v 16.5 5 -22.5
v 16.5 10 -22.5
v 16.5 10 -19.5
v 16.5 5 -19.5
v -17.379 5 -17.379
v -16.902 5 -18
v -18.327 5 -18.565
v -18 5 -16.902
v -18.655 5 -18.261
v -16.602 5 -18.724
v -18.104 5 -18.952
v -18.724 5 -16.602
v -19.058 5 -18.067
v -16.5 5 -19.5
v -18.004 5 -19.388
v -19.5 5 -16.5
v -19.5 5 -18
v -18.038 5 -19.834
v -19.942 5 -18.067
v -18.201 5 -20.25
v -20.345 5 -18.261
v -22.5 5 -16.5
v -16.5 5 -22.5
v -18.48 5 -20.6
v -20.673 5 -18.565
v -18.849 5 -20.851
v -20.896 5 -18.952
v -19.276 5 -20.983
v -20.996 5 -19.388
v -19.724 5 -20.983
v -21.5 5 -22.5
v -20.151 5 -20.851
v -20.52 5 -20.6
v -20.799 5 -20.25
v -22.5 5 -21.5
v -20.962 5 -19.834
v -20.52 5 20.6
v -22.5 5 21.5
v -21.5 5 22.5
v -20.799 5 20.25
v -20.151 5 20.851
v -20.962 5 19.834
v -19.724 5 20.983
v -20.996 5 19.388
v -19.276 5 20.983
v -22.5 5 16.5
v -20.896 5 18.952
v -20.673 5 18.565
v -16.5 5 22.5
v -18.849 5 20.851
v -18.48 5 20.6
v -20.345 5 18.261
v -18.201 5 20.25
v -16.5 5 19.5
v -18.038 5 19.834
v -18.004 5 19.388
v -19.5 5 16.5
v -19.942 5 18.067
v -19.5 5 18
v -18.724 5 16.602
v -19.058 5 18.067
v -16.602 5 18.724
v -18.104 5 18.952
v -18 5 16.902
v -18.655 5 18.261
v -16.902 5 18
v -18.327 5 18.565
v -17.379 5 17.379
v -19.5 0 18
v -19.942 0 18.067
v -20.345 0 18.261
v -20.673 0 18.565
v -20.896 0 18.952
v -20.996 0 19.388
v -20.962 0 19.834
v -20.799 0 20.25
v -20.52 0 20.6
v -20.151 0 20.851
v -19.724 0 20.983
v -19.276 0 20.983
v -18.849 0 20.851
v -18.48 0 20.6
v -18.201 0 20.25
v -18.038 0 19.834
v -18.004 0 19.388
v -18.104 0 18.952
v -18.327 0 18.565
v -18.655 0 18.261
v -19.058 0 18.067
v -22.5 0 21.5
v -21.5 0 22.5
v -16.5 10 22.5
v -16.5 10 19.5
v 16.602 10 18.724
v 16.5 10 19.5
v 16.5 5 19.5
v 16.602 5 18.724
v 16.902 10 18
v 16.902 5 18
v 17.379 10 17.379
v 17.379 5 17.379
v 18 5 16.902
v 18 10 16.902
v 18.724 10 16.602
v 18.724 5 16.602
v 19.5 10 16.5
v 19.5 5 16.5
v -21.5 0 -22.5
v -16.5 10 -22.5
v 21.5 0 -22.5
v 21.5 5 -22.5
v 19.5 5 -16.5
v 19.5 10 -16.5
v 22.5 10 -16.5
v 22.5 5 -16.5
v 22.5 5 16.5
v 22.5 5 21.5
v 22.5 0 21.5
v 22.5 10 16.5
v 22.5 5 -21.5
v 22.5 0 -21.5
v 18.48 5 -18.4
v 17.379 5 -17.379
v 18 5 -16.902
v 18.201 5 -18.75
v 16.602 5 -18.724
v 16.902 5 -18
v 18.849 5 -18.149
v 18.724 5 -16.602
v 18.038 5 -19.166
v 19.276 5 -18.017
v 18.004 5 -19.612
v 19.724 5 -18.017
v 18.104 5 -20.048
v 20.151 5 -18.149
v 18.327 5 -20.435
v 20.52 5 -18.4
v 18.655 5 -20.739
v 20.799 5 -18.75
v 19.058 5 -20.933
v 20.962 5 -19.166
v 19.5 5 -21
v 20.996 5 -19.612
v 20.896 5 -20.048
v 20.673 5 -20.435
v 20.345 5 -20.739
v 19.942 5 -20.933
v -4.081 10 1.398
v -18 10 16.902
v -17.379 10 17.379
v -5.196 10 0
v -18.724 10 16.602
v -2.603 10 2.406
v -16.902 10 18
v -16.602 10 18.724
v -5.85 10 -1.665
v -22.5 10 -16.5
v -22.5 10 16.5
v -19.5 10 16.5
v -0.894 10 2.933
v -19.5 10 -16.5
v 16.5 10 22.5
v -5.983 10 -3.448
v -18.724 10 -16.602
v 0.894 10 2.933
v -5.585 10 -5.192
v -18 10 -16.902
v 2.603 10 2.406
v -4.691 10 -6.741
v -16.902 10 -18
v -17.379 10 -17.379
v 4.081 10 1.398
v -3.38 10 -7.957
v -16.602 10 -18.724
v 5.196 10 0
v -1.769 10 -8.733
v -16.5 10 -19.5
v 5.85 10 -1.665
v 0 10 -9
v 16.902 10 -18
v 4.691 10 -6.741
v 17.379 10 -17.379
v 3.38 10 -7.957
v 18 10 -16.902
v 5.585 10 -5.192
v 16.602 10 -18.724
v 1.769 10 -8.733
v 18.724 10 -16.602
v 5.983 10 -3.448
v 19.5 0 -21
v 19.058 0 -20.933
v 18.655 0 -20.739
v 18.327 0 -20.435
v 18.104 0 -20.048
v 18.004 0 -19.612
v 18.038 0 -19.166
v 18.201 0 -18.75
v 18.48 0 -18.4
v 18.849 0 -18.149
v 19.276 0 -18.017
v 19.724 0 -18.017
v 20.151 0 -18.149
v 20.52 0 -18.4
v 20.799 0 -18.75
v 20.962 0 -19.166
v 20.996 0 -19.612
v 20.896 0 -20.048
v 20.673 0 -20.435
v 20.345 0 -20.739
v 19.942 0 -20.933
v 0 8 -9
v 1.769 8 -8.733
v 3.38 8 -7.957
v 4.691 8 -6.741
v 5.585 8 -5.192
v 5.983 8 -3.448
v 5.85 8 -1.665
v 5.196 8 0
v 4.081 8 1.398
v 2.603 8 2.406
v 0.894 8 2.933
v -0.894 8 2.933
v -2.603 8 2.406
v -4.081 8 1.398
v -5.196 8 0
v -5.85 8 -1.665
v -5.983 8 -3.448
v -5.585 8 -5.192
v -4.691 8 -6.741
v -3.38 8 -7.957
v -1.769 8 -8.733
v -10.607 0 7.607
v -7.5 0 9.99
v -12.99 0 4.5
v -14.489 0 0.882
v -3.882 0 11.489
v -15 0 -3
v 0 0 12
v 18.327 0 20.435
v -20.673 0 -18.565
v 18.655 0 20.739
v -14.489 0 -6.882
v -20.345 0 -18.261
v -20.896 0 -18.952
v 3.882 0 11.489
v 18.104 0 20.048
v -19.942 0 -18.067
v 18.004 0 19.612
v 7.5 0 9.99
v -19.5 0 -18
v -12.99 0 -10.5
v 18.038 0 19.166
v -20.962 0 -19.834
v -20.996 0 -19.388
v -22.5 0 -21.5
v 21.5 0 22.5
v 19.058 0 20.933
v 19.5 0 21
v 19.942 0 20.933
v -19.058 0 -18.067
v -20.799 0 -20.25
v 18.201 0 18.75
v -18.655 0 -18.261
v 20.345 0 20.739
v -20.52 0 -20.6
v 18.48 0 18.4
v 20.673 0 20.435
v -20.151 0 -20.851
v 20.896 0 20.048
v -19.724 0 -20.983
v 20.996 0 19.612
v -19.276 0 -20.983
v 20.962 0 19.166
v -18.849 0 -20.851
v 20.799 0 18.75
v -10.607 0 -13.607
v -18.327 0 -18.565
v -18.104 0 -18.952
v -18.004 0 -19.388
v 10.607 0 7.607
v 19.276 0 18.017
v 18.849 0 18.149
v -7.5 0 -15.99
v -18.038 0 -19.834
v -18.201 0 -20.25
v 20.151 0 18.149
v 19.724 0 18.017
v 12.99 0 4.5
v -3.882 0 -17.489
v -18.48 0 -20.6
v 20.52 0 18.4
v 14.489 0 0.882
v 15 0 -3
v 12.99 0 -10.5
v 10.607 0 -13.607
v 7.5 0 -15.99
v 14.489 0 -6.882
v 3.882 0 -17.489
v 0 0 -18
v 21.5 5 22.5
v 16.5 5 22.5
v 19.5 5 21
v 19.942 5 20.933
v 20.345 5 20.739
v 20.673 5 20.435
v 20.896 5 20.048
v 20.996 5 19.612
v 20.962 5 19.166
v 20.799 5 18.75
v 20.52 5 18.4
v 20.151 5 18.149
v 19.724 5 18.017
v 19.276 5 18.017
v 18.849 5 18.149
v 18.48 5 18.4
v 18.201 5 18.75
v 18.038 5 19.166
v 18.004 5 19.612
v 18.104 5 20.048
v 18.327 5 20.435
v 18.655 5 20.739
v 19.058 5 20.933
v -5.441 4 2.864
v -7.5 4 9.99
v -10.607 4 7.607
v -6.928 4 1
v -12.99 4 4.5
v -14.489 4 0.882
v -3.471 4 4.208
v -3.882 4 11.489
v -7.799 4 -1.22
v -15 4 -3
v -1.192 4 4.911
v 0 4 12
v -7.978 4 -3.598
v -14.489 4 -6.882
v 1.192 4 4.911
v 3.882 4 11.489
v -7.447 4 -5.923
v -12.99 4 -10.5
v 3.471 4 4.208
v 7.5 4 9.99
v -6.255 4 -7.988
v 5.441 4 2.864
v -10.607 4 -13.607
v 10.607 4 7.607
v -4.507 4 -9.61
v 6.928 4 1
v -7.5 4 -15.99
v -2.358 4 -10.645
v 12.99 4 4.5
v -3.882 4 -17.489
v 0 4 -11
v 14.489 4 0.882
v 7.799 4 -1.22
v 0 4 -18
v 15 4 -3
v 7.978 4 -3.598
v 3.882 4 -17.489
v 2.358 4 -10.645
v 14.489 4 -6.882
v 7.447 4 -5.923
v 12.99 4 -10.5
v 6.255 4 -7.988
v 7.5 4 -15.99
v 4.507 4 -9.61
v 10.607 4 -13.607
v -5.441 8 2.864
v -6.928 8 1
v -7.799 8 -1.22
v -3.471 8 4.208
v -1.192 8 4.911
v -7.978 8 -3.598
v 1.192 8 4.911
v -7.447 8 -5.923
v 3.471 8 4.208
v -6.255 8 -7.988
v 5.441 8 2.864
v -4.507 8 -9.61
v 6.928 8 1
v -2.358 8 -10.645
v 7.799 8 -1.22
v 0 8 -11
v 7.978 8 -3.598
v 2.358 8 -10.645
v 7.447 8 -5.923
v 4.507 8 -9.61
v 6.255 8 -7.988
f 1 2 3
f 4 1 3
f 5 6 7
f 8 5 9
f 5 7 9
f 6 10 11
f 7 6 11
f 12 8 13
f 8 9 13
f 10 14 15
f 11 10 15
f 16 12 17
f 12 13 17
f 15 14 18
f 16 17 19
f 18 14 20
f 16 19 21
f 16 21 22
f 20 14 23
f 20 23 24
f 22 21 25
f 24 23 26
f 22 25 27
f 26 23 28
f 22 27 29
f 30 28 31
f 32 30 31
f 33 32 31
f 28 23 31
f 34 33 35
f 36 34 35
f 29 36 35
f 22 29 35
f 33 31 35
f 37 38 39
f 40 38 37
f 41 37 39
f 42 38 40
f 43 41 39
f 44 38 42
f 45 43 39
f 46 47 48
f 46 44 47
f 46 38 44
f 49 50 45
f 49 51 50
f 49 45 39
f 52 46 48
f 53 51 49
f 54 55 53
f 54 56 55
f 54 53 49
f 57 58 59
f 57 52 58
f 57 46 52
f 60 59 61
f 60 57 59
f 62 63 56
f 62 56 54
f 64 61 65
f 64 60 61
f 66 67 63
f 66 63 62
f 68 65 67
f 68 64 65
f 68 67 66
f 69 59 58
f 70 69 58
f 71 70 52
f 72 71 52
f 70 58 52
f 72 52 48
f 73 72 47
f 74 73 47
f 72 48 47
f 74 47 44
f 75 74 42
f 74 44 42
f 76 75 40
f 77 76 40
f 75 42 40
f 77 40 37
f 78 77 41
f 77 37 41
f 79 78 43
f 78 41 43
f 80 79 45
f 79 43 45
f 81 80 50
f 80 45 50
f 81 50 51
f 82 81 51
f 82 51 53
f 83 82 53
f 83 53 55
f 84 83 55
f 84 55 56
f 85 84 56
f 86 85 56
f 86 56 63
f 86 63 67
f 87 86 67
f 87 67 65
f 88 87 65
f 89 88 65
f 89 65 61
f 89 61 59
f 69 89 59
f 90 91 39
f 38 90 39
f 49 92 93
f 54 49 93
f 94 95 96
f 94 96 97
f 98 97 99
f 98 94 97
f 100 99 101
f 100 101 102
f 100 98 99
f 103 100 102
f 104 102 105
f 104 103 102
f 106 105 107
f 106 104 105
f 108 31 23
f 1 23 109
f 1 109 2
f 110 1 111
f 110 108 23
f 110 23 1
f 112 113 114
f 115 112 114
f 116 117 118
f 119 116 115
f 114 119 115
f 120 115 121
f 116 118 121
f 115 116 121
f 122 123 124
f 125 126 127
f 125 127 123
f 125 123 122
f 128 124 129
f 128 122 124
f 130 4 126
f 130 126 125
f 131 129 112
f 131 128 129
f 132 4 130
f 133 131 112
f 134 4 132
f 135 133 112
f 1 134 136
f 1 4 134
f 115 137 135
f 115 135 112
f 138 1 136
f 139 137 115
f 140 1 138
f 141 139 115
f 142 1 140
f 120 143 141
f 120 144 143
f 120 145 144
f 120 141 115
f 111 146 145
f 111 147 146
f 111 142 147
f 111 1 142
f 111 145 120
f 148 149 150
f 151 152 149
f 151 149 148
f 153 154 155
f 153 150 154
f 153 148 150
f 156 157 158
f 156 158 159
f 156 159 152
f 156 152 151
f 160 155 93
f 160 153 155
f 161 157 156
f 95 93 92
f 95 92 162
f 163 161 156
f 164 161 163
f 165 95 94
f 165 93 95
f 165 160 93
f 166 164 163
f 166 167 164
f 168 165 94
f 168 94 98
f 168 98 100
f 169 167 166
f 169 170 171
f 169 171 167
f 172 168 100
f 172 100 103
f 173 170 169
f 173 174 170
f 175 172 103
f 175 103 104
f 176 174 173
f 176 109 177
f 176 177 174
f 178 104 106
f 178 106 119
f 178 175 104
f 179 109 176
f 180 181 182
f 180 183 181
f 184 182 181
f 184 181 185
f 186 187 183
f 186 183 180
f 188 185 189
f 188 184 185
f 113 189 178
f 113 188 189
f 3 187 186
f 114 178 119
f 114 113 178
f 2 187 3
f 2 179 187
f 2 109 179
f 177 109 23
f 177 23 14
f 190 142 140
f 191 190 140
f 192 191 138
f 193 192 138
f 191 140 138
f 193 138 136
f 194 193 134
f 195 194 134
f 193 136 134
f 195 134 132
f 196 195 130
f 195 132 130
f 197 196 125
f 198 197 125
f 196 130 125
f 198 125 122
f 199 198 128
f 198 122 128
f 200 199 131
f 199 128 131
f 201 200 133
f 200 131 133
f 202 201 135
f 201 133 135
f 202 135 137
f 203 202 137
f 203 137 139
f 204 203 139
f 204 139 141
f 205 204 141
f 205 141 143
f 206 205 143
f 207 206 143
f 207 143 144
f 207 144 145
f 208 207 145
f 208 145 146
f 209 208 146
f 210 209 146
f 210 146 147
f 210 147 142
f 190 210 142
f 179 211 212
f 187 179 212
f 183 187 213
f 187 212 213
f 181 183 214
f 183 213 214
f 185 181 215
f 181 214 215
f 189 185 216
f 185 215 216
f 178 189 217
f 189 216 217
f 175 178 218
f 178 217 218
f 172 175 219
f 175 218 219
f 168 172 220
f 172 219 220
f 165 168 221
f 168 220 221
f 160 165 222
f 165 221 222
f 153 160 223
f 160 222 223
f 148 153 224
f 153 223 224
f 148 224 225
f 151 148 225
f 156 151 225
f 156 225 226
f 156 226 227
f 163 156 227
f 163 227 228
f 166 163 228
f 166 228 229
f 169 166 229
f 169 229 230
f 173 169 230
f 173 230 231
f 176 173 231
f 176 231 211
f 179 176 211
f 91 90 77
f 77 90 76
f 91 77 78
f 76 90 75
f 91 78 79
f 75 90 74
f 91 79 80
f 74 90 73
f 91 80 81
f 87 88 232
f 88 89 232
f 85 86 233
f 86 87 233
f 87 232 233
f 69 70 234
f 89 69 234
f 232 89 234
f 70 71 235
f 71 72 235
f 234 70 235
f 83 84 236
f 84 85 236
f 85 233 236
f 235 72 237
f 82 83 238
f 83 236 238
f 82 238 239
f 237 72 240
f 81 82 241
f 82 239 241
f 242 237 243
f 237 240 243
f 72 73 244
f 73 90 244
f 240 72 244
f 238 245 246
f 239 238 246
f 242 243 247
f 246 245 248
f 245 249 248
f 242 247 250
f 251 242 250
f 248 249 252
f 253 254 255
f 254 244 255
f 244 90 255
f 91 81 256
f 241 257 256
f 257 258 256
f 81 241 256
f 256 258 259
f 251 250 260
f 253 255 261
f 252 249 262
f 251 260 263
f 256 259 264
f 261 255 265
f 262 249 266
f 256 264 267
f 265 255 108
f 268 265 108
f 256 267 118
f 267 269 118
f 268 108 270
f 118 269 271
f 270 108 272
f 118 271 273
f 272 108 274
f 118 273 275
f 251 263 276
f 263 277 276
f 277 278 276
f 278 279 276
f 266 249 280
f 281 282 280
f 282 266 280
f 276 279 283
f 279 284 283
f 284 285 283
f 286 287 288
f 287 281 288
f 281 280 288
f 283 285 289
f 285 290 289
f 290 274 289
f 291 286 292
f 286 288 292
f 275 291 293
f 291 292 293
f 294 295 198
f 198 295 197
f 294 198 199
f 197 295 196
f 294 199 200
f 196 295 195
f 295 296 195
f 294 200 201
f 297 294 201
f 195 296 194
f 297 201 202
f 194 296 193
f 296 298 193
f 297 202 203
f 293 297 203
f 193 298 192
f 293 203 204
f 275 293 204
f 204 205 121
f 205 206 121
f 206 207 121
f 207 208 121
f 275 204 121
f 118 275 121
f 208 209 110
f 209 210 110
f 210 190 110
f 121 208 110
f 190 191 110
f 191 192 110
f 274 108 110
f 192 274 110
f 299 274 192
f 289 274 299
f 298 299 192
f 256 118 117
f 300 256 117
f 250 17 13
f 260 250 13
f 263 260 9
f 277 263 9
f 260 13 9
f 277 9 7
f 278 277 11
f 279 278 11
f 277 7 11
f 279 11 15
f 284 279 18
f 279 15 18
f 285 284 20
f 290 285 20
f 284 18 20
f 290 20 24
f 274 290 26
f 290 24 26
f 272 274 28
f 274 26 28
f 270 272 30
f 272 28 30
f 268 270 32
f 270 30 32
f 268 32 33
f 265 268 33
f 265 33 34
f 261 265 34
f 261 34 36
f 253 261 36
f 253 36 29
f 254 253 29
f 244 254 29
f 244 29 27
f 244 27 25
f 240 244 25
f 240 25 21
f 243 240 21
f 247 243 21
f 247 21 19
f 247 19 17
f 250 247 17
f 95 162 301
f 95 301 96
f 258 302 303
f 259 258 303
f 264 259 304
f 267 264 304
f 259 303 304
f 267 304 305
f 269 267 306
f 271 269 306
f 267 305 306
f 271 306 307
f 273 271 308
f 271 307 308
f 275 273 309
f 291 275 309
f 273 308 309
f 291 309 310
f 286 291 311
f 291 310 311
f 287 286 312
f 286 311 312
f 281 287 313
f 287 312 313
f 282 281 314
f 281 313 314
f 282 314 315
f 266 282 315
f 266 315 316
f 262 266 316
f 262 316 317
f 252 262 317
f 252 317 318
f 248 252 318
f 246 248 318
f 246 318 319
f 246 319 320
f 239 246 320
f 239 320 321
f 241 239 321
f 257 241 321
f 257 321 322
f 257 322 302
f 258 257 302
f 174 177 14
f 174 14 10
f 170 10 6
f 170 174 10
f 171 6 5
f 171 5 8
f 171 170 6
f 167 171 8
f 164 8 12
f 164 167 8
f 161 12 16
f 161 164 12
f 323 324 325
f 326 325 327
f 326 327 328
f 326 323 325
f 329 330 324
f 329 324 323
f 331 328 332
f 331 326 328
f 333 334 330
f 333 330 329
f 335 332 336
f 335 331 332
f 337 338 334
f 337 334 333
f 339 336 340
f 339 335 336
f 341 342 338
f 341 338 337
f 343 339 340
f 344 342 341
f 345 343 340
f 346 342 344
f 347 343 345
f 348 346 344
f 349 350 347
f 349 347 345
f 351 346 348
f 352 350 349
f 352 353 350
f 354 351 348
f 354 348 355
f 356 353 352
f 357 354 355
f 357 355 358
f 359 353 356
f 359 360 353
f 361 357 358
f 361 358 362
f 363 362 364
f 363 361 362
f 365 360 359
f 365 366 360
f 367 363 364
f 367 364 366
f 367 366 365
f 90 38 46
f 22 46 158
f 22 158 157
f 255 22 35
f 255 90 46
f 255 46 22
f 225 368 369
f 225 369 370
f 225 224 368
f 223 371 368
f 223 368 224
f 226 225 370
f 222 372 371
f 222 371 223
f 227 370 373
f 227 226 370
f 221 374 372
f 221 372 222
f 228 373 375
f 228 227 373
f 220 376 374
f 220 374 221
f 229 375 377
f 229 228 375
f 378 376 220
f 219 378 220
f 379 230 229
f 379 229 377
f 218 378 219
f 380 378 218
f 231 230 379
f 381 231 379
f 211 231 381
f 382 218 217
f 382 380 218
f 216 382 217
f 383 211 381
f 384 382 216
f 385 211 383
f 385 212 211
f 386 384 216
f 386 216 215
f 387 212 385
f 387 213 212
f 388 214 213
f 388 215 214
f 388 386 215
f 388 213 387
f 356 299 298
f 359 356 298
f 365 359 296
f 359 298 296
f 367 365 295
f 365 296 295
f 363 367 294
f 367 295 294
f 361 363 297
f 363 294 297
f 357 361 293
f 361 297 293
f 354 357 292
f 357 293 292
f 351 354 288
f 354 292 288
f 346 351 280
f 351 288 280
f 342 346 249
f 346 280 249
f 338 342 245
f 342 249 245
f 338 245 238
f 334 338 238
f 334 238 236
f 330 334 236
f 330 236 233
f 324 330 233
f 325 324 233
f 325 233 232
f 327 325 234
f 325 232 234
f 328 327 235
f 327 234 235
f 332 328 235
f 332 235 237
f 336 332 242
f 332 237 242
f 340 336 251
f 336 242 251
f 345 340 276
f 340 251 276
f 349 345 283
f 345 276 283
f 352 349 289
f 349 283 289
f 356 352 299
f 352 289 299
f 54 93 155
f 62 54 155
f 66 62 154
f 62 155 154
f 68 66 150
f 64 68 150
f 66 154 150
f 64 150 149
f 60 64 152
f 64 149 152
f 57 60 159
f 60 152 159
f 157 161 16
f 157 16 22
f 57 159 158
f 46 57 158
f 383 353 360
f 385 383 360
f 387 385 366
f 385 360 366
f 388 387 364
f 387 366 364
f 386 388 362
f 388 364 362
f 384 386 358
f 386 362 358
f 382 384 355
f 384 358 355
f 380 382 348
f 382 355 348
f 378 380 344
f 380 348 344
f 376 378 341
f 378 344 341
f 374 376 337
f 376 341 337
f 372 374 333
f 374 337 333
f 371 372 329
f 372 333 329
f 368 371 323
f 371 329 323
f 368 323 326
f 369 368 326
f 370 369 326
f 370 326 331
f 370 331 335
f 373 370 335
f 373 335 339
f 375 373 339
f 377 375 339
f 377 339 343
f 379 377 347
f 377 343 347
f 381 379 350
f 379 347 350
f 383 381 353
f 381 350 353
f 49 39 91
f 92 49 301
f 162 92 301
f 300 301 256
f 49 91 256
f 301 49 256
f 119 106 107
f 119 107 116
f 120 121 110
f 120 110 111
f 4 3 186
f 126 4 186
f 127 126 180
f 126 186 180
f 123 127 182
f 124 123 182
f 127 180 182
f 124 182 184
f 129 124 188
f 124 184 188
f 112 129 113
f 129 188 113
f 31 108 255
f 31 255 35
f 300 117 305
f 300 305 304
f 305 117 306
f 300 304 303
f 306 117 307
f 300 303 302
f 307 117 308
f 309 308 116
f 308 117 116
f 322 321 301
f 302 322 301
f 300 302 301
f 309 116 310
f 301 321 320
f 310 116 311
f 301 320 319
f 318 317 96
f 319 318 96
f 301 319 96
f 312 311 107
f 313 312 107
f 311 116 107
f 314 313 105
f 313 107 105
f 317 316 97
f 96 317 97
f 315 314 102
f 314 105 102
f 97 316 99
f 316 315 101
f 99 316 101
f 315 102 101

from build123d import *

# Parameters (mm, degrees)
SKETCH_1_W          = 45
SKETCH_1_H          = 45
EXTRUDE_1_DEPTH     = 10
SKETCH_2_R          = 4
CUT_EXTRUDE_4_DEPTH = 34.35416016
SKETCH_3_R          = 15
CUT_EXTRUDE_5_DEPTH = 4
SKETCH_4_R          = 8
CUT_EXTRUDE_6_DEPTH = 4
SKETCH_5_R          = 1.5
CUT_EXTRUDE_7_DEPTH = 34.35416016
CUT_EXTRUDE_8_DEPTH = 5
CHAMFER_1_SIZE      = 1
SKETCH_7_R          = 6
CUT_EXTRUDE_9_DEPTH = 33.810059433


with BuildPart() as part:
    # 草图1 → 凸台-拉伸1 (new body)
    with BuildSketch(Plane(origin=(0, 0, 0), x_dir=(1, 0, 0), z_dir=(0, 1, 0))):
        Rectangle(SKETCH_1_W, SKETCH_1_H)
    extrude(amount=EXTRUDE_1_DEPTH)

    # 草图2 → 切除-拉伸4 (cut, through all)
    with BuildSketch(Plane(origin=(0, 0, 0), x_dir=(1, 0, 0), z_dir=(0, 1, 0))):
        with Locations(Location((0, 3, 0), (0, 0, 270))):
            Circle(SKETCH_2_R)
    extrude(amount=CUT_EXTRUDE_4_DEPTH, mode=Mode.SUBTRACT)

    # 草图3 → 切除-拉伸5 (cut)
    with BuildSketch(Plane.XZ):
        with Locations(Location((0, -3, 0), (0, 0, 270))):
            Circle(SKETCH_3_R)
    extrude(amount=-CUT_EXTRUDE_5_DEPTH, mode=Mode.SUBTRACT)

    # 草图4 → 切除-拉伸6 (cut)
    with BuildSketch(Plane.XZ.offset(-4)):
        with Locations(Location((0, -3, 0), (0, 0, 270))):
            Circle(SKETCH_4_R)
    extrude(amount=-CUT_EXTRUDE_6_DEPTH, mode=Mode.SUBTRACT)

    # 草图5 → 切除-拉伸7 (cut, through all)
    with BuildSketch(Plane(origin=(0, 10, 0), x_dir=(1, 0, 0), z_dir=(0, 1, 0))):
        with Locations(Location((-19.5, 19.5, 0), (0, 0, 270))):
            Circle(SKETCH_5_R)
        with Locations(Location((19.5, 19.5, 0), (0, 0, 90))):
            Circle(SKETCH_5_R)
        with Locations(Location((19.5, -19.5, 0), (0, 0, 270))):
            Circle(SKETCH_5_R)
        with Locations(Location((-19.5, -19.5, 0), (0, 0, 90))):
            Circle(SKETCH_5_R)
    extrude(amount=-CUT_EXTRUDE_7_DEPTH, mode=Mode.SUBTRACT)

    # 草图6 → 切除-拉伸8 (cut)
    with BuildSketch(Plane(origin=(0, 10, 0), x_dir=(1, 0, 0), z_dir=(0, 1, 0))):
        with BuildLine():
            Line((-16.5, 22.5), (-16.5, 19.5))
            ThreePointArc((-16.5, 19.5), (-17.378679656, 17.378679656), (-19.5, 16.5))
            Line((-19.5, 16.5), (-22.5, 16.5))
            Line((-22.5, 16.5), (-22.5, 22.5))
            Line((-22.5, 22.5), (-16.5, 22.5))
        make_face()
        with BuildLine():
            Line((22.5, 16.5), (22.5, 22.5))
            Line((22.5, 22.5), (16.5, 22.5))
            Line((16.5, 22.5), (16.5, 19.5))
            ThreePointArc((16.5, 19.5), (17.378679656, 17.378679656), (19.5, 16.5))
            Line((19.5, 16.5), (22.5, 16.5))
        make_face()
        with BuildLine():
            Line((19.5, -16.5), (22.5, -16.5))
            Line((22.5, -16.5), (22.5, -22.5))
            Line((22.5, -22.5), (16.5, -22.5))
            Line((16.5, -22.5), (16.5, -19.5))
            ThreePointArc((16.5, -19.5), (17.378679656, -17.378679656), (19.5, -16.5))
        make_face()
        with BuildLine():
            Line((-22.5, -16.5), (-22.5, -22.5))
            Line((-22.5, -22.5), (-16.5, -22.5))
            Line((-16.5, -22.5), (-16.5, -19.5))
            ThreePointArc((-16.5, -19.5), (-17.378679656, -17.378679656), (-19.5, -16.5))
            Line((-19.5, -16.5), (-22.5, -16.5))
        make_face()
    extrude(amount=-CUT_EXTRUDE_8_DEPTH, mode=Mode.SUBTRACT)

    # 倒角1
    chamfer_1_edges = [part.edges().sort_by_distance(p)[0] for p in [
        (22.5, 2.5, 22.5),
        (-22.5, 2.5, 22.5),
        (-22.5, 2.5, -22.5),
        (22.5, 2.5, -22.5),
    ]]
    chamfer(chamfer_1_edges, length=CHAMFER_1_SIZE)

    # 草图7 → 切除-拉伸9 (cut, through all)
    with BuildSketch(Plane.XZ.offset(-8)):
        with Locations(Location((0, -3, 0), (0, 0, 270))):
            Circle(SKETCH_7_R)
    extrude(amount=-CUT_EXTRUDE_9_DEPTH, mode=Mode.SUBTRACT)


solid = part.part
